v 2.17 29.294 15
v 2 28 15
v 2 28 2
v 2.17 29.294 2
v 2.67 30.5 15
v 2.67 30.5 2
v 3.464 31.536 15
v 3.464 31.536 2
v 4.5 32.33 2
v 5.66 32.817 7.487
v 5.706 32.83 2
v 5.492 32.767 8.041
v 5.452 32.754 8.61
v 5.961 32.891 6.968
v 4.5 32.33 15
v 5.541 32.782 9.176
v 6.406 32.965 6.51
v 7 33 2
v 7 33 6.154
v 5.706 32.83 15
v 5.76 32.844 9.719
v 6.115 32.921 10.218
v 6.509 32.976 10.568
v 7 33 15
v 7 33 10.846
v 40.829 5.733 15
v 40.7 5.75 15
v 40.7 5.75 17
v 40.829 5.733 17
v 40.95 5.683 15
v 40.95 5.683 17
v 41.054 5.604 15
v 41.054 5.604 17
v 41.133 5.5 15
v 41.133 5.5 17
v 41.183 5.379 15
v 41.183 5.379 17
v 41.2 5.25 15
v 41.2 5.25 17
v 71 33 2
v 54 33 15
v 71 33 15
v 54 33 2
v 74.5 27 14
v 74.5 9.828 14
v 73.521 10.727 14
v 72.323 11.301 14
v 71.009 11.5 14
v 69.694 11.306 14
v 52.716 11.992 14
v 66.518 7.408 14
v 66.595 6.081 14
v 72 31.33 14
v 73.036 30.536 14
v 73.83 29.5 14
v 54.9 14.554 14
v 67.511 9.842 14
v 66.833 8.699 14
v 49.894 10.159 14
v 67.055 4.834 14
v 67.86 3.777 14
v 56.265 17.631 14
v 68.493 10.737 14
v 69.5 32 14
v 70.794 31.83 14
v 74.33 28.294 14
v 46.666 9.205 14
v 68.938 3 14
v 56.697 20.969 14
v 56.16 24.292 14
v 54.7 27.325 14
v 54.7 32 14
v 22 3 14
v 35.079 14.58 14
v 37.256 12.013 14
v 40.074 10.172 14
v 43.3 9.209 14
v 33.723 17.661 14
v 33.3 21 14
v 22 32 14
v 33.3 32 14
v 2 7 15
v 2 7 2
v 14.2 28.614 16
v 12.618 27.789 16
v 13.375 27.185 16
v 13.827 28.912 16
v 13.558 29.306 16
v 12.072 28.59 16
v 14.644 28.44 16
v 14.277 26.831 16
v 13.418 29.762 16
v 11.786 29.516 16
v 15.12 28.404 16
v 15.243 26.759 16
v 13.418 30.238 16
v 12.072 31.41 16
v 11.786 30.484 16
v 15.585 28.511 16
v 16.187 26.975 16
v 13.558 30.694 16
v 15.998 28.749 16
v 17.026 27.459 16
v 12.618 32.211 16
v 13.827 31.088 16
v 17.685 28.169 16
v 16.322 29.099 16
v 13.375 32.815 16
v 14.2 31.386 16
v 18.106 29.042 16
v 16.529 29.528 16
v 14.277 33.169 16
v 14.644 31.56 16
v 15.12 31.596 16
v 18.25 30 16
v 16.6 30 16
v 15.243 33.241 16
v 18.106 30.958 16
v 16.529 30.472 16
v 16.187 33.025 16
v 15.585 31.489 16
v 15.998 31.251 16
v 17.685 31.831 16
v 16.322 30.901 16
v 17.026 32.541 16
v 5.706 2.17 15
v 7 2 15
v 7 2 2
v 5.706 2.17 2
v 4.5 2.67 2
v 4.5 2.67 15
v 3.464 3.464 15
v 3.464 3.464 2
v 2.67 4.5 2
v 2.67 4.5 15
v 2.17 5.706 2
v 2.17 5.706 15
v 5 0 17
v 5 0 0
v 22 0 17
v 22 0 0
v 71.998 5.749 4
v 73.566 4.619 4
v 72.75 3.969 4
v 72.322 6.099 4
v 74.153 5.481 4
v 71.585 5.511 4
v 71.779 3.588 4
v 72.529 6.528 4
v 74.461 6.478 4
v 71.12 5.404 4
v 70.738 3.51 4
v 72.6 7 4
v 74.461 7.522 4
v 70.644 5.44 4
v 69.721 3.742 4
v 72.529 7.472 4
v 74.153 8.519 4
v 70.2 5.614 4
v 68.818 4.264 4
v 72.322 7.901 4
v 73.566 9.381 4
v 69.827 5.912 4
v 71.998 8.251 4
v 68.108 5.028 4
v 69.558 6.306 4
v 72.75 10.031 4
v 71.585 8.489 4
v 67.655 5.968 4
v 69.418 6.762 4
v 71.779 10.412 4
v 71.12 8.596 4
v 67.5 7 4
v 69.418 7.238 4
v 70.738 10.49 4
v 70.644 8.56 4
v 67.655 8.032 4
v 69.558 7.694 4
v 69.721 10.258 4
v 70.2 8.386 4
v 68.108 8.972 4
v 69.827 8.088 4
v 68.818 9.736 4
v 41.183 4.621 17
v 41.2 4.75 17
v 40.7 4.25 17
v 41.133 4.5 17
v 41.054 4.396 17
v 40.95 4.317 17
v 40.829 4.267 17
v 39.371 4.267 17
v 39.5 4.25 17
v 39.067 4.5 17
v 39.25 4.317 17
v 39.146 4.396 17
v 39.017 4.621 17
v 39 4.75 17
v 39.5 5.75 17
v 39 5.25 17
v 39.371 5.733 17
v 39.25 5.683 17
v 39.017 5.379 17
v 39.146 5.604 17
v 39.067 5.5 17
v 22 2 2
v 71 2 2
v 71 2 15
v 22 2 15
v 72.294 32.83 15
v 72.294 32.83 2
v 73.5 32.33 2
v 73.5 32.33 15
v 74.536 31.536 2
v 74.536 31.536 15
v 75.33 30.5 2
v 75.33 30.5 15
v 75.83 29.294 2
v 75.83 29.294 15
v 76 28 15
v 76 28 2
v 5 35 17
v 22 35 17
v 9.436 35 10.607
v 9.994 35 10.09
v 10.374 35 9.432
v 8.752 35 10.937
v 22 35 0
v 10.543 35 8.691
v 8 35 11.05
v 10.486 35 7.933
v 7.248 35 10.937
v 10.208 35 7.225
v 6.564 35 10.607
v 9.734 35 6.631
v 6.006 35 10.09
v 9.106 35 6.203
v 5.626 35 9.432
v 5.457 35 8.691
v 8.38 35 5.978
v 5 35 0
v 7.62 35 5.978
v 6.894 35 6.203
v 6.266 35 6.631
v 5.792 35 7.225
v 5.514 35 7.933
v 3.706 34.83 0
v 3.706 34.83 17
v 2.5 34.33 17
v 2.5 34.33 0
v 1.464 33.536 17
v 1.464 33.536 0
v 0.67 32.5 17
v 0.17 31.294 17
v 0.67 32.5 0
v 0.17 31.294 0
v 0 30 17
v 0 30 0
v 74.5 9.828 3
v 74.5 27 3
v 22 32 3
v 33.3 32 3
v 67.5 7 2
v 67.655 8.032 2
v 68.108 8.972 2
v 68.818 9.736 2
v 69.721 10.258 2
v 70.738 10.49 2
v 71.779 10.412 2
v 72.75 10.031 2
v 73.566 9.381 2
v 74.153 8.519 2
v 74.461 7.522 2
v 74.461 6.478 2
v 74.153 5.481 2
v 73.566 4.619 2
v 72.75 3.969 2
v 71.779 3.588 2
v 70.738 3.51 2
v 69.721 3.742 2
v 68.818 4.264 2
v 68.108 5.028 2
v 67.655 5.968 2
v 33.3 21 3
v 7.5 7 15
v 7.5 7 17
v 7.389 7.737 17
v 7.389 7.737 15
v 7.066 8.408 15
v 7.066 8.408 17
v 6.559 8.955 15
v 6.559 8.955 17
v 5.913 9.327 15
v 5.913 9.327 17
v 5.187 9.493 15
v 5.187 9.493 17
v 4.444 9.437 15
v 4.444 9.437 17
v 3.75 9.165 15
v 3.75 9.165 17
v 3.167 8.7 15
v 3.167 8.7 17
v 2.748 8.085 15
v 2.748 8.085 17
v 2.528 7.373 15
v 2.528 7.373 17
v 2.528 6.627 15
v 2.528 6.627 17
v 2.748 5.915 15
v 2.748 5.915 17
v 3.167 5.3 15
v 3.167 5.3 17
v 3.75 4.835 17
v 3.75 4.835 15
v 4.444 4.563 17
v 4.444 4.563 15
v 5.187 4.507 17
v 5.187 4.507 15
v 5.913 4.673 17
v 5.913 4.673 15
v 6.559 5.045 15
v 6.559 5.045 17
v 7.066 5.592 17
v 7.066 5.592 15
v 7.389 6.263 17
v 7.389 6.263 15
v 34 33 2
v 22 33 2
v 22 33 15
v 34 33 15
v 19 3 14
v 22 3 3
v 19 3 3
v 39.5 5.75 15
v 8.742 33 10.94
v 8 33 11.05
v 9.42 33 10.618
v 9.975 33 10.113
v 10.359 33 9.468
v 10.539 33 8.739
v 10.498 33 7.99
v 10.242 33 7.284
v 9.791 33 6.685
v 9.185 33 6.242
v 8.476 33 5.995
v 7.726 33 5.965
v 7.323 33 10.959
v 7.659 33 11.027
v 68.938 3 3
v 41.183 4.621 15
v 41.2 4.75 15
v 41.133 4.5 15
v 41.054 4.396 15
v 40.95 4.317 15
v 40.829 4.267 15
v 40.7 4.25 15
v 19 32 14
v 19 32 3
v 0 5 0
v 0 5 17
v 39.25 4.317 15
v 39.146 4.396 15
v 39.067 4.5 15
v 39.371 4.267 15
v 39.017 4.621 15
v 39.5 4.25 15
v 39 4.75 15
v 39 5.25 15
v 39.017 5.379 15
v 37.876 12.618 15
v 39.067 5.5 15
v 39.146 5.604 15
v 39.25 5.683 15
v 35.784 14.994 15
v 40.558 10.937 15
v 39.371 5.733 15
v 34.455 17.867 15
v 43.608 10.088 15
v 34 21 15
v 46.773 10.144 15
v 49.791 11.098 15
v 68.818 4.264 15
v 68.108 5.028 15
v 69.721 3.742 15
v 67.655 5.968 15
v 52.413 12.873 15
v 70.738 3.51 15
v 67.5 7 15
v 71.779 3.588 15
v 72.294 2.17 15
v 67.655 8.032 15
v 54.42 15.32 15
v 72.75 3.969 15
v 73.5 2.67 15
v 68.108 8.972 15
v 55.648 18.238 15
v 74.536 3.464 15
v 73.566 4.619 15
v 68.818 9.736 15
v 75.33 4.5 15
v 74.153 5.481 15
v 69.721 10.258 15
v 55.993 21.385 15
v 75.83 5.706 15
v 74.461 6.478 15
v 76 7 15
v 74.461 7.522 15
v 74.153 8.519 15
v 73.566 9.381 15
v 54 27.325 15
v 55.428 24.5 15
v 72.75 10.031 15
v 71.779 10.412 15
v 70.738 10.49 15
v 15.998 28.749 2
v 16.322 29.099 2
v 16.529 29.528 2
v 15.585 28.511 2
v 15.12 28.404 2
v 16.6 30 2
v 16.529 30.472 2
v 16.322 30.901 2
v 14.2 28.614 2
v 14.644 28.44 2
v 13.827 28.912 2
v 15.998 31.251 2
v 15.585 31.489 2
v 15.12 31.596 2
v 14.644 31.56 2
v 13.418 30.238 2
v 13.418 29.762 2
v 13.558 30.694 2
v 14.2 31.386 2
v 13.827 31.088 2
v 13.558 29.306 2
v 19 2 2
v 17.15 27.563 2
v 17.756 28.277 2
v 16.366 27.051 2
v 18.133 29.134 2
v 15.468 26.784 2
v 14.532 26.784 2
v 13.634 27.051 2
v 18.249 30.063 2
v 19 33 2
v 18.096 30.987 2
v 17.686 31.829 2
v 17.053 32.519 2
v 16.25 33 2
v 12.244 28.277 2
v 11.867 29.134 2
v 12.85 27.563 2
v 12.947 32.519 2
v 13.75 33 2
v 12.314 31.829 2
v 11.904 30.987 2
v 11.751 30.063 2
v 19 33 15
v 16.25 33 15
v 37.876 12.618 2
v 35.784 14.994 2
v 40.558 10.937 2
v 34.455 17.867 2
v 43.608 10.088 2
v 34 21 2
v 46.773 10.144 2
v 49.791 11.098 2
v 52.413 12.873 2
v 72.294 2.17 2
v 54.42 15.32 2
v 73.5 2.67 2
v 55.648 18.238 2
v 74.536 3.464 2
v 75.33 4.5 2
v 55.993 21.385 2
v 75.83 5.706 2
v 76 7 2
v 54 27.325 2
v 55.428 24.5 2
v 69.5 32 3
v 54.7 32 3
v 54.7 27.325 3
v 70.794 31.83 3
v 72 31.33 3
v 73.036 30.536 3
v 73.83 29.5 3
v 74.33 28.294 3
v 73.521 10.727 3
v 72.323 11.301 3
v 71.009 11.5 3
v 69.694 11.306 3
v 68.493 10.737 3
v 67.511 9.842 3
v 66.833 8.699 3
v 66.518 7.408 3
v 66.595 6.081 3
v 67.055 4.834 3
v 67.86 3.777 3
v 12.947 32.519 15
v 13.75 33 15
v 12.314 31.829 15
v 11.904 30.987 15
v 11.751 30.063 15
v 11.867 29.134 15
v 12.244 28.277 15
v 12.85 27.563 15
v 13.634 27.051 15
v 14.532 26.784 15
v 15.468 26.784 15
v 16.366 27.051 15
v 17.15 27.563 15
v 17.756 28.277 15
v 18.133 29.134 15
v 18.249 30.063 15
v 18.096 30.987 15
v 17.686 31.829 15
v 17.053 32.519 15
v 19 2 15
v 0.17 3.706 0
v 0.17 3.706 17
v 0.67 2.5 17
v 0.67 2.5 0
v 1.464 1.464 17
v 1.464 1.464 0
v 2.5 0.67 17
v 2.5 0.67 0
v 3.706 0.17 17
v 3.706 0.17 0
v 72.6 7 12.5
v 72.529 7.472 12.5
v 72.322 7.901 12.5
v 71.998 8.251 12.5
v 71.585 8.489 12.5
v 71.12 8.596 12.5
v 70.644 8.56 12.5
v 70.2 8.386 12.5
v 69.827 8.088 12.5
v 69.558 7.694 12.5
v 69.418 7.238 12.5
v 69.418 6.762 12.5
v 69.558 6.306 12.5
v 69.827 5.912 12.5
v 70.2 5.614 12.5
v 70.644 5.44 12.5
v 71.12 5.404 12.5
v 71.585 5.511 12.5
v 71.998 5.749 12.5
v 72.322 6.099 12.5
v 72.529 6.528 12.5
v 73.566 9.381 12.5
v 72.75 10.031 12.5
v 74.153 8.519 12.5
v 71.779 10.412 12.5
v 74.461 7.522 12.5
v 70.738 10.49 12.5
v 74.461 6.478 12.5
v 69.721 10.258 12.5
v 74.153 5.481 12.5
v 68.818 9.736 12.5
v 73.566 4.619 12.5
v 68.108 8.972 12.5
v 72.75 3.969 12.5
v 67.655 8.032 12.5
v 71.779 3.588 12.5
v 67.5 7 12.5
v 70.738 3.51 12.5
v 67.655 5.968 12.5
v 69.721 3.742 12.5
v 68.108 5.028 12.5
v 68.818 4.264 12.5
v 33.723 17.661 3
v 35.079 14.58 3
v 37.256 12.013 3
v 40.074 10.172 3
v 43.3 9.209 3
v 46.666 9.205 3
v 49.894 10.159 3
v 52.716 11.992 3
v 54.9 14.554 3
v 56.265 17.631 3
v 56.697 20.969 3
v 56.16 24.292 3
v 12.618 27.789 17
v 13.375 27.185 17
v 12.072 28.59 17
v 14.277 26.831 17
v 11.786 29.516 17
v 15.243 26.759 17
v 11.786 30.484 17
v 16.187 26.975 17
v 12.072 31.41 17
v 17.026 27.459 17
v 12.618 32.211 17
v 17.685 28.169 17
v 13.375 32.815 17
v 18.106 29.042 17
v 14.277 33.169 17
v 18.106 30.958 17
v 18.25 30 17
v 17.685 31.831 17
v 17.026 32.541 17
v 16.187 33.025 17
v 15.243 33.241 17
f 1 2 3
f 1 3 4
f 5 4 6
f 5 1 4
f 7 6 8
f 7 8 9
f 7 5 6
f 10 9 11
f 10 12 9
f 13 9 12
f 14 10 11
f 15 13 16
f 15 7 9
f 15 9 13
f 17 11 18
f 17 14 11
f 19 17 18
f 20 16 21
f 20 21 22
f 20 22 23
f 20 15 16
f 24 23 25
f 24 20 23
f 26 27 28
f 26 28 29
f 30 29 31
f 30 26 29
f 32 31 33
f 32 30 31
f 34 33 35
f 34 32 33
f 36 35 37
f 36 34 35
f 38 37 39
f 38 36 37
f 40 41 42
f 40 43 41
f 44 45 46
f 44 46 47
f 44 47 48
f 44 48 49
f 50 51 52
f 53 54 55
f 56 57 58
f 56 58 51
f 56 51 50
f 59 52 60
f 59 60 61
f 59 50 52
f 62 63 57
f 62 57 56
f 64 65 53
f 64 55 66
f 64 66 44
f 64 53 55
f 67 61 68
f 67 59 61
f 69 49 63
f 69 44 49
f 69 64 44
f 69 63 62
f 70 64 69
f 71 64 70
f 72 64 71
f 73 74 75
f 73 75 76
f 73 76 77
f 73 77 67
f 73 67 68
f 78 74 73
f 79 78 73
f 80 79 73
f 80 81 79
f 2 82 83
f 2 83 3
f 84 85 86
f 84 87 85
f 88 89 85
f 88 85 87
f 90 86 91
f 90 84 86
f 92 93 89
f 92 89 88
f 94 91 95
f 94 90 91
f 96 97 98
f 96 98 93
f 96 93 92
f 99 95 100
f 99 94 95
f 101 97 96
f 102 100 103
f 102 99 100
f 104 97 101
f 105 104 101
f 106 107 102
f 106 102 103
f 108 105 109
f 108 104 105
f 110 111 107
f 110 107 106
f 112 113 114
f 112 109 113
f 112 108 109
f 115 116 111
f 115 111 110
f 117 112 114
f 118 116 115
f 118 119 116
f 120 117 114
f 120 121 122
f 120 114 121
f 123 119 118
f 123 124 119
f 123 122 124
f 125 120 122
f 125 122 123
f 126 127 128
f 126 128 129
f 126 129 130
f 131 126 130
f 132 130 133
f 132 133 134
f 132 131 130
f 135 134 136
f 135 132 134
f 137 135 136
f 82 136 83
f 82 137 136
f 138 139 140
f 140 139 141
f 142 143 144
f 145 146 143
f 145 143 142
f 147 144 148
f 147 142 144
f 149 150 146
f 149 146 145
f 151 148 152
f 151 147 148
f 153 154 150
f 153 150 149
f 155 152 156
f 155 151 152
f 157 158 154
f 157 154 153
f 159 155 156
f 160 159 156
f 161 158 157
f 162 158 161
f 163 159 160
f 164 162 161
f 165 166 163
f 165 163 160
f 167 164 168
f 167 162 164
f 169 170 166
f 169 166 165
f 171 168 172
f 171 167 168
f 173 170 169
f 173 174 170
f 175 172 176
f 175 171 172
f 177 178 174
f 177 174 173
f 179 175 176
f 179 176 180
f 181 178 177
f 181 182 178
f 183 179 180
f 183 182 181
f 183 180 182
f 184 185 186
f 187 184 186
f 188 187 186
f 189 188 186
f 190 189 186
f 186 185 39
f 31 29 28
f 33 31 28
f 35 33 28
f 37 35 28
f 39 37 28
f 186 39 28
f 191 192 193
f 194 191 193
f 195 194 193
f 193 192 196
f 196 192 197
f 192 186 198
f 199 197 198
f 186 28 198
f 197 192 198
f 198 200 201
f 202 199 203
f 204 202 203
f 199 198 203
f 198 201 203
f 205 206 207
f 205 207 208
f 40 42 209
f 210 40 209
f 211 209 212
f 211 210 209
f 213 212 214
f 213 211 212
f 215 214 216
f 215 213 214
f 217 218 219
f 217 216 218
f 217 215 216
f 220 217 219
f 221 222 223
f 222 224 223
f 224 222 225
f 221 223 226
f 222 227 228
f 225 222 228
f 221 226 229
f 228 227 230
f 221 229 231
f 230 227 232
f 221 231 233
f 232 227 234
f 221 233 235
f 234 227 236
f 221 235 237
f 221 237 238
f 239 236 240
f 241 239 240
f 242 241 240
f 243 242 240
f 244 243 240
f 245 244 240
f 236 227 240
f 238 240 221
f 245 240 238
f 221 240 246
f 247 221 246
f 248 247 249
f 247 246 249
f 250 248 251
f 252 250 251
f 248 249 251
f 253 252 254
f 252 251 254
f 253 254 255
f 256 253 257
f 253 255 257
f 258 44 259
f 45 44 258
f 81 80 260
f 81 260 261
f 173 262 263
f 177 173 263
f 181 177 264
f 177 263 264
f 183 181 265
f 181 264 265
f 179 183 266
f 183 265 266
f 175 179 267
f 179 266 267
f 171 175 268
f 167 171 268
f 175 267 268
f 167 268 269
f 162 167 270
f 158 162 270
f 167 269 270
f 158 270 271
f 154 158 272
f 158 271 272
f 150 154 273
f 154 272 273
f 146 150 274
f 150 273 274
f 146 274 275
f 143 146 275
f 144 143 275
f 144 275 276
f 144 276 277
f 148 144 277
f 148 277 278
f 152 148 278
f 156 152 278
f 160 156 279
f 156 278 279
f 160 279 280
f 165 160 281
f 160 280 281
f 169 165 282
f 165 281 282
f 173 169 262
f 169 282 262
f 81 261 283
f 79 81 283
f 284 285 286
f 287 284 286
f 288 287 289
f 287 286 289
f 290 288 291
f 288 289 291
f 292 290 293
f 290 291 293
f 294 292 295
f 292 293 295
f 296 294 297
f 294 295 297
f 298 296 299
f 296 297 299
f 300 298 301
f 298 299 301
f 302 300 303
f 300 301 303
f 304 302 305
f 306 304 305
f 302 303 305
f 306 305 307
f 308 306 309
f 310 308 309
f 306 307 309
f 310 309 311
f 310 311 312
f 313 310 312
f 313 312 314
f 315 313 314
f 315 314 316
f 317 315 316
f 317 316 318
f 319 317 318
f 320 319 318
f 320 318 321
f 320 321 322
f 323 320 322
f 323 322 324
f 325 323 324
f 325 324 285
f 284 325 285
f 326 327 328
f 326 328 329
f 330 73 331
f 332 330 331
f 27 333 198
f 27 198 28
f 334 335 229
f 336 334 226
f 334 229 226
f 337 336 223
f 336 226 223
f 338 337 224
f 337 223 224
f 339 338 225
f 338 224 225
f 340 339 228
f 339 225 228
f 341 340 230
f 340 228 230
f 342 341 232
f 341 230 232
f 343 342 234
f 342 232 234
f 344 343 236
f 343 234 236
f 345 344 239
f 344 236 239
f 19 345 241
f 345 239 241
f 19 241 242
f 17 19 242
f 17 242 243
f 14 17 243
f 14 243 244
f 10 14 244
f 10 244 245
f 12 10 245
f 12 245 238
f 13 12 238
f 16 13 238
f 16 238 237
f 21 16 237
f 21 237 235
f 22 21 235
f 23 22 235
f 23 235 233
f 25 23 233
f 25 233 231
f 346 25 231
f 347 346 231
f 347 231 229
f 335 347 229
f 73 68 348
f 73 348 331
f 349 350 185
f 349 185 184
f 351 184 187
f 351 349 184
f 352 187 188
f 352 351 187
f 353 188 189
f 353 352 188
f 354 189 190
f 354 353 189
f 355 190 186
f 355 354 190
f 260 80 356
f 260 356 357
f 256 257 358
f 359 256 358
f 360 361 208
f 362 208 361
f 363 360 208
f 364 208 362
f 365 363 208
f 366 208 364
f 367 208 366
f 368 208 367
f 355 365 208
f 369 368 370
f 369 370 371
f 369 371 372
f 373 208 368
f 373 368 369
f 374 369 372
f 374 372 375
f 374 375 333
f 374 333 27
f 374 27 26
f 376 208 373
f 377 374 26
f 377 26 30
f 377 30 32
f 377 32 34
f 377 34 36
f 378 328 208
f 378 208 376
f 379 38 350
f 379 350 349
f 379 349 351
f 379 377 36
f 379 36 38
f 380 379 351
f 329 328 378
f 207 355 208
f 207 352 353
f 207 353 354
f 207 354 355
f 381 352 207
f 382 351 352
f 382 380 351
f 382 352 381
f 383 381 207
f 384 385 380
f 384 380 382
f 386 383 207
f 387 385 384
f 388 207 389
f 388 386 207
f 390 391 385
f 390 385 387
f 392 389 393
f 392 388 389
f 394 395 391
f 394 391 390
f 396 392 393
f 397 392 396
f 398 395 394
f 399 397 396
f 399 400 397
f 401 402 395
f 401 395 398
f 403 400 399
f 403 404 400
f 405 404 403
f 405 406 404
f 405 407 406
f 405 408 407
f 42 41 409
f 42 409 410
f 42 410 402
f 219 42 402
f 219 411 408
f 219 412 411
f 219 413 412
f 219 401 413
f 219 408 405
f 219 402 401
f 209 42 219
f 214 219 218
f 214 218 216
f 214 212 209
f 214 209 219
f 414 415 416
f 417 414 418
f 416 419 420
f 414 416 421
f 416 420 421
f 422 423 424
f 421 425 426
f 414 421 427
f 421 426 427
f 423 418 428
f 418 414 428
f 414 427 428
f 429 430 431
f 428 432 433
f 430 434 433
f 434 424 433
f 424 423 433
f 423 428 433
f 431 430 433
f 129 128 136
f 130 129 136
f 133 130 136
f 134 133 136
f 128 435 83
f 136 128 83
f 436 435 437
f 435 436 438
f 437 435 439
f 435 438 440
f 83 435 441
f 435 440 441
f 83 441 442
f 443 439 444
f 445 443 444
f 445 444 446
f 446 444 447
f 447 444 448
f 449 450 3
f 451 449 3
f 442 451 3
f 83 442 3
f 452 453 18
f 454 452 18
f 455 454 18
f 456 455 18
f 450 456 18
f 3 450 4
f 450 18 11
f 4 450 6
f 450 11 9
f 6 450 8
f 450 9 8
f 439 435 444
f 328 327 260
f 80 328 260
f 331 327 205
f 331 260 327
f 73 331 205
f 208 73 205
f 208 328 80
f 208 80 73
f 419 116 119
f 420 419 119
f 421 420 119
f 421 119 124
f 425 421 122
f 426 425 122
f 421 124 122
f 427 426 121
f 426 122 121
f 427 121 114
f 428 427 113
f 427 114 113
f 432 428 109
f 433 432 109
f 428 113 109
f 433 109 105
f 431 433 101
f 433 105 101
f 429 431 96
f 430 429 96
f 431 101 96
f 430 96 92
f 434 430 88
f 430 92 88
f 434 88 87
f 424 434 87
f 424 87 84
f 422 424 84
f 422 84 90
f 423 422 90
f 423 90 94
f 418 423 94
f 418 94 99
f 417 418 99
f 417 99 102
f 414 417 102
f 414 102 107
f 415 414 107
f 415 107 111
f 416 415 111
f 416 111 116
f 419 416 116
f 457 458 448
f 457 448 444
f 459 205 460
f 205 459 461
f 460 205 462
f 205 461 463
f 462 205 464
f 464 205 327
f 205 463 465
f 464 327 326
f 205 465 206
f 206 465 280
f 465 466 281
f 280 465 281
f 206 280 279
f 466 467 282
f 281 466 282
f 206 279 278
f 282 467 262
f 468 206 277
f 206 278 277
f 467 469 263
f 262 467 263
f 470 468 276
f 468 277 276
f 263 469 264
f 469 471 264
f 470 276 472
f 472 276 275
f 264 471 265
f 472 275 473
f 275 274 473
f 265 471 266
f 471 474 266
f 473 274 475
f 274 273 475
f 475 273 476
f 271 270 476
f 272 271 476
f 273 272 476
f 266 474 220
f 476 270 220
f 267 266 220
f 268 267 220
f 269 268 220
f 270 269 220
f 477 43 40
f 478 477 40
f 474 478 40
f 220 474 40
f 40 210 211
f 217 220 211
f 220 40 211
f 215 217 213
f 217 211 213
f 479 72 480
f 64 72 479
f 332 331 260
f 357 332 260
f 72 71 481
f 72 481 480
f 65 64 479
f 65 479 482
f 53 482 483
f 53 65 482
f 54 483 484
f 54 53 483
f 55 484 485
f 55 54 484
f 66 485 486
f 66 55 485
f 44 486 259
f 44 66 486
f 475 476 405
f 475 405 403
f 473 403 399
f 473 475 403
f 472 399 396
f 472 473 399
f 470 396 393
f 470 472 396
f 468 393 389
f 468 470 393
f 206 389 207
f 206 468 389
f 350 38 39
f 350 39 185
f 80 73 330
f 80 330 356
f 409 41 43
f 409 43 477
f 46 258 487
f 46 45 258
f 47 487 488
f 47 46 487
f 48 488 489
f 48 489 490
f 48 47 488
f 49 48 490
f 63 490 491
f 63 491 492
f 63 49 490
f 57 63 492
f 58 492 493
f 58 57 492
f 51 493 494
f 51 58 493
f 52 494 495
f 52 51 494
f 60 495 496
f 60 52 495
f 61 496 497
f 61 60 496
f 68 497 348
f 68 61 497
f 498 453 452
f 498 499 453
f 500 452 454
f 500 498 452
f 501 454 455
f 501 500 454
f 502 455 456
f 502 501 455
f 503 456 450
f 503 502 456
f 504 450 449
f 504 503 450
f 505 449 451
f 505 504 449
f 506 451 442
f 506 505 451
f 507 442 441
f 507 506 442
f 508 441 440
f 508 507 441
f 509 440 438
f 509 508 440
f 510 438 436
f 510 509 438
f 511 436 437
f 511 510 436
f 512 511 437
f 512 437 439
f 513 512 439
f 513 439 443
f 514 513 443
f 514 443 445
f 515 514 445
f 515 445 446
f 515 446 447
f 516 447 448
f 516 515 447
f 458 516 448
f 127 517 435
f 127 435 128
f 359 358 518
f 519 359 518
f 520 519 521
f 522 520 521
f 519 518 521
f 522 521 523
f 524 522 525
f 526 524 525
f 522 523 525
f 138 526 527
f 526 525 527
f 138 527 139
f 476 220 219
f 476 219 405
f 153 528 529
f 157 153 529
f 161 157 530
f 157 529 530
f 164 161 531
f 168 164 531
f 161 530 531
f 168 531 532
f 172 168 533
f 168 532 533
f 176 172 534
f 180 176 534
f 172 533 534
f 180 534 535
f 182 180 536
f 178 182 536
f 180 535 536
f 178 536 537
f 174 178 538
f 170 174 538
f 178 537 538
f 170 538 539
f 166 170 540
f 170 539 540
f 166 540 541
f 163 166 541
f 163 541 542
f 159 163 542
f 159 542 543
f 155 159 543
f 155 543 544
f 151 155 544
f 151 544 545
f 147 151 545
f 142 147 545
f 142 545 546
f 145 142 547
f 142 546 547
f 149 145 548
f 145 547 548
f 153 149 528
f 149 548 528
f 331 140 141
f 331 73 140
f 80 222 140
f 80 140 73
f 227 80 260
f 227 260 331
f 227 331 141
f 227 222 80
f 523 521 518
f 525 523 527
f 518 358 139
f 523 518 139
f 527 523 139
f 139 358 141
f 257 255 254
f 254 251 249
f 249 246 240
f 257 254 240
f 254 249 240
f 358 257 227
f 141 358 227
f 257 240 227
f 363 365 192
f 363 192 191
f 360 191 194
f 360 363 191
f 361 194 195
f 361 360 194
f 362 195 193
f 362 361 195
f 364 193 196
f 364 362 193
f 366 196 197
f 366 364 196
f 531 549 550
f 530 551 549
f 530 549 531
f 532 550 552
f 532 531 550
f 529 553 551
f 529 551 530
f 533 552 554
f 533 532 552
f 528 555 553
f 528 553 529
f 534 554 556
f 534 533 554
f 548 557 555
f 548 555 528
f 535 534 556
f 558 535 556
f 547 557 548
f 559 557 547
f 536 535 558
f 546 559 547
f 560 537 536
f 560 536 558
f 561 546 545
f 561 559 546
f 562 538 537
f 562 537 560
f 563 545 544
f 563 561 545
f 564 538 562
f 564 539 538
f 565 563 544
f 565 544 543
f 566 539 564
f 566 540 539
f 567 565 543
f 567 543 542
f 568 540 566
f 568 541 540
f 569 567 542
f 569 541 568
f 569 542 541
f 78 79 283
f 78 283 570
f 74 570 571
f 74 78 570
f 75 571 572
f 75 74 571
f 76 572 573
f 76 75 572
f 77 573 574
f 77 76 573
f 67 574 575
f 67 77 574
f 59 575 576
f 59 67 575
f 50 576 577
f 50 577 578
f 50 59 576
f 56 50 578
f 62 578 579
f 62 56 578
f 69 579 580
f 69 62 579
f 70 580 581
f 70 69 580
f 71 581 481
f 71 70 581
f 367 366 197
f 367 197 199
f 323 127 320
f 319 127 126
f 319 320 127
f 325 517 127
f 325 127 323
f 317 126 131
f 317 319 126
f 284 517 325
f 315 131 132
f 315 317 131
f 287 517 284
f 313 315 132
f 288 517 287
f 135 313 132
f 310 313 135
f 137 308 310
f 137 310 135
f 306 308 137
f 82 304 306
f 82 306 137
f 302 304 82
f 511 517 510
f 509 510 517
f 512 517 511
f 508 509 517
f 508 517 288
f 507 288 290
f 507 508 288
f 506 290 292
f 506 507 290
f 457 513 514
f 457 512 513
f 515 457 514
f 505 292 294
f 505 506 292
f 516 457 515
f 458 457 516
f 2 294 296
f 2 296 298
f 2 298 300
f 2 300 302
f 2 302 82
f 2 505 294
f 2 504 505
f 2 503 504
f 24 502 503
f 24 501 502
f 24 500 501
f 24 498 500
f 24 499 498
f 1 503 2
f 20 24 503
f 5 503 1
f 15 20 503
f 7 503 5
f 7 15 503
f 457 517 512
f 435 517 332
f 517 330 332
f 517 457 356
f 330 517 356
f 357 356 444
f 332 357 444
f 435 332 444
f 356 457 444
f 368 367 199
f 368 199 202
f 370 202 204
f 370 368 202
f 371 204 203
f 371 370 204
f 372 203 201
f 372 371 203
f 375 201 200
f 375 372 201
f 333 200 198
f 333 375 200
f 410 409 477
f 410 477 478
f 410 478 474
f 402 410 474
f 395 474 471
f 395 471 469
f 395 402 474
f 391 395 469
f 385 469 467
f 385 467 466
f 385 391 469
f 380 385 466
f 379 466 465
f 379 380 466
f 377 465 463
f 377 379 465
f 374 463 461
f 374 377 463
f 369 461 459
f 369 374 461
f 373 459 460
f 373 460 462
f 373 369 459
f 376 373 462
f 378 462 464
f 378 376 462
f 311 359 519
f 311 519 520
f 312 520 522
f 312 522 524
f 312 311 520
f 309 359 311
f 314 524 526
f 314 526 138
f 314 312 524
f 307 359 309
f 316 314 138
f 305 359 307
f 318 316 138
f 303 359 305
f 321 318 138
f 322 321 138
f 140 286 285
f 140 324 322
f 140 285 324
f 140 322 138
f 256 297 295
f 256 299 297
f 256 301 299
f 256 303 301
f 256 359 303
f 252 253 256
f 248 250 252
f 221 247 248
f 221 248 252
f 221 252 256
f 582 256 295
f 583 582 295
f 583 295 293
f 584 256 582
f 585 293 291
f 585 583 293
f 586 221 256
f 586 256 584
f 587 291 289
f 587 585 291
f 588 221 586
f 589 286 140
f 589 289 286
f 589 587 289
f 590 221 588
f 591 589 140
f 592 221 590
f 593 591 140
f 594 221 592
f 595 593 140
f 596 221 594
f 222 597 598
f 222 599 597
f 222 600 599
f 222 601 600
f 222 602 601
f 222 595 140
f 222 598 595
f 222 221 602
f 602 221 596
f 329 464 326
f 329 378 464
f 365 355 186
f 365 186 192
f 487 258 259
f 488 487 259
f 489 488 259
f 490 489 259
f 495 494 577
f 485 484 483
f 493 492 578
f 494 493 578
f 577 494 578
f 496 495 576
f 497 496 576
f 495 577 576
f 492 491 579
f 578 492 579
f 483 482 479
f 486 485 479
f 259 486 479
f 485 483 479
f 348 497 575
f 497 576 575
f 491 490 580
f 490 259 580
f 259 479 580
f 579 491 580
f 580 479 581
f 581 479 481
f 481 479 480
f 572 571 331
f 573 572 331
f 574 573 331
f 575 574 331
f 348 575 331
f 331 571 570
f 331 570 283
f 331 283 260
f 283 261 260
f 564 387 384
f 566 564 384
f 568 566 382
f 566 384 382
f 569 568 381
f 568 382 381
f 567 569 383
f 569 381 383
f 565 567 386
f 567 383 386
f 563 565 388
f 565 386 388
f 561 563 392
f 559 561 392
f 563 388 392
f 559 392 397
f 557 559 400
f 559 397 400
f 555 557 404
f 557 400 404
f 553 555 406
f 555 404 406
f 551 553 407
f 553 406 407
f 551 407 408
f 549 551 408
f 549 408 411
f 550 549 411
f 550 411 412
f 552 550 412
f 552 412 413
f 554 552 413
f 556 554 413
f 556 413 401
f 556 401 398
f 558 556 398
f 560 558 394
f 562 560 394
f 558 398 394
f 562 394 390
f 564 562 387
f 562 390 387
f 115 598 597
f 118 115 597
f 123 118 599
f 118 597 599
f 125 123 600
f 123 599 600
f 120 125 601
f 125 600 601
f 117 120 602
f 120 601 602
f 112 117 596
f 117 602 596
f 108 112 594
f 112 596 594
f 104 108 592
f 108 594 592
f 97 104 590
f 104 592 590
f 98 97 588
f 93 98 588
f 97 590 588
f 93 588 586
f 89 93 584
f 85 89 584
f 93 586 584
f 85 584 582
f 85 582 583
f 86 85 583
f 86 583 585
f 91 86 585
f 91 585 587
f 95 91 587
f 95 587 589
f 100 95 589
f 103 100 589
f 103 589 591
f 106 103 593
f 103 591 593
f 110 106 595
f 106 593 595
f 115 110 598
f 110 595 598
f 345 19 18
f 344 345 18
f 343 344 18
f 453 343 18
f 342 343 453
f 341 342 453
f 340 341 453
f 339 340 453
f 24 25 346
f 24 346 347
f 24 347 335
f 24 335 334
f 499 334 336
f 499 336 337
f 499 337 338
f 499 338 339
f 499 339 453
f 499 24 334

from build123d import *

# Parameters (mm, degrees)
BOSS_EXTRUDE1_DEPTH  = 17
CUT_EXTRUDE1_START   = -17
SKETCH3_W            = 12
SKETCH3_H            = 2
CUT_EXTRUDE1_DEPTH   = 17
CUT_EXTRUDE2_START   = -2
CUT_EXTRUDE2_DEPTH   = 2
SKETCH5_W            = 60
SKETCH5_H            = 35
CUT_EXTRUDE3_DEPTH   = 2
CUT_EXTRUDE4_DEPTH   = 11
CUT_EXTRUDE11_DEPTH  = 13
BOSS_EXTRUDE2_DEPTH  = 2
SKETCH13_R           = 2.5
CUT_EXTRUDE12_DEPTH  = 5
SKETCH14_R           = 2.55
CUT_EXTRUDE14_DEPTH  = 15
BOSS_EXTRUDE5_REACH  = 87.381
SKETCH15_R           = 3.25
SKETCH15_R_2         = 1.6
SKETCH15_4_R         = 3.25
SKETCH15_4_R_2       = 1.6
CUT_EXTRUDE16_DEPTH  = 1
SKETCH18_R           = 1.6
CUT_EXTRUDE17_DEPTH  = 15
SKETCH20_R           = 4.5
SKETCH20_R_2         = 1.6
BOSS_EXTRUDE6_DEPTH  = 13
SKETCH20_3_R         = 1.6
CUT_EXTRUDE20_DEPTH  = 86.005882191
SKETCH22_W           = 13
SKETCH22_H           = 31
SKETCH22_W_2         = 11
SKETCH22_H_2         = 29
BOSS_EXTRUDE7_DEPTH  = 3
SKETCH21_R           = 3.5
CUT_EXTRUDE21_DEPTH  = 2
SKETCH29_R           = 3.5
CUT_EXTRUDE22_DEPTH  = 2.5
BOSS_EXTRUDE10_DEPTH = 13


with BuildPart() as part:
    # Sketch1 → Boss-Extrude1 (new body)
    with BuildSketch(Plane.XY):
        with BuildLine():
            ThreePointArc((0, 5), (1.464466094, 1.464466094), (5, 0))
            Line((5, 0), (73, 0))
            ThreePointArc((73, 0), (76.535533906, 1.464466094), (78, 5))
            Line((78, 5), (78, 30))
            ThreePointArc((78, 30), (76.535533906, 33.535533906), (73, 35))
            Line((73, 35), (54, 35))
            Line((54, 35), (54, 27.32455532))
            ThreePointArc((54, 27.32455532), (48.31662479, 10.511911518), (34, 21))
            Line((34, 21), (34, 35))
            Line((34, 35), (5, 35))
            ThreePointArc((5, 35), (1.464466094, 33.535533906), (0, 30))
            Line((0, 30), (0, 5))
        make_face()
    extrude(amount=BOSS_EXTRUDE1_DEPTH)

    # Sketch3 → Cut-Extrude1 (cut)
    with BuildSketch(Plane.XY.offset(17).offset(CUT_EXTRUDE1_START)):
        with Locations((28, 34)):
            Rectangle(SKETCH3_W, SKETCH3_H)
        with BuildLine():
            Line((54, 33), (71, 33))
            ThreePointArc((71, 33), (74.535533906, 31.535533906), (76, 28))
            Line((76, 28), (76, 7))
            ThreePointArc((76, 7), (74.535533906, 3.464466094), (71, 2))
            Line((71, 2), (22, 2))
            Line((22, 2), (22, 0))
            Line((22, 0), (73, 0))
            ThreePointArc((73, 0), (76.535533906, 1.464466094), (78, 5))
            Line((78, 5), (78, 30))
            ThreePointArc((78, 30), (76.535533906, 33.535533906), (73, 35))
            Line((73, 35), (54, 35))
            Line((54, 35), (54, 33))
        make_face()
    extrude(amount=CUT_EXTRUDE1_DEPTH, mode=Mode.SUBTRACT)

    # Sketch3<3> → Cut-Extrude2 (cut)
    with BuildSketch(Plane.XY.offset(17).offset(CUT_EXTRUDE2_START)):
        with BuildLine():
            ThreePointArc((76, 28), (74.535533906, 31.535533906), (71, 33))
            Line((71, 33), (54, 33))
            Line((54, 33), (54, 27.32455532))
            ThreePointArc((54, 27.32455532), (48.31662479, 10.511911518), (34, 21))
            Line((34, 21), (34, 33))
            Line((34, 33), (22, 33))
            Line((22, 33), (22, 2))
            Line((22, 2), (71, 2))
            ThreePointArc((71, 2), (74.535533906, 3.464466094), (76, 7))
            Line((76, 7), (76, 28))
        make_face()
    extrude(amount=CUT_EXTRUDE2_DEPTH, mode=Mode.SUBTRACT)

    # Sketch5 → Cut-Extrude3 (cut)
    with BuildSketch(Plane(origin=(0, 0, 0), x_dir=(-1, 0, 0), z_dir=(0, 0, -1))):
        with Locations((-52, 15.5)):
            Rectangle(SKETCH5_W, SKETCH5_H)
    extrude(amount=-CUT_EXTRUDE3_DEPTH, mode=Mode.SUBTRACT)

    # Sketch6 → Cut-Extrude4 (cut)
    with BuildSketch(Plane.XY.offset(14)):
        with BuildLine():
            Line((22, 32), (69.5, 32))
            ThreePointArc((69.5, 32), (73.035533906, 30.535533906), (74.5, 27))
            Line((74.5, 27), (74.5, 8))
            ThreePointArc((74.5, 8), (73.035533906, 4.464466094), (69.5, 3))
            Line((69.5, 3), (22, 3))
            Line((22, 3), (22, 32))
        make_face()
    extrude(amount=-CUT_EXTRUDE4_DEPTH, mode=Mode.SUBTRACT)

    # Sketch11 → Cut-Extrude11 (cut)
    with BuildSketch(Plane.XY.offset(15)):
        with BuildLine():
            Line((22, 2), (7, 2))
            ThreePointArc((7, 2), (3.464466094, 3.464466094), (2, 7))
            Line((2, 7), (2, 28))
            ThreePointArc((2, 28), (3.464466094, 31.535533906), (7, 33))
            Line((7, 33), (22, 33))
            Line((22, 33), (22, 2))
        make_face()
    extrude(amount=-CUT_EXTRUDE11_DEPTH, mode=Mode.SUBTRACT)


with BuildPart() as cut_extrude11_piece_1:
    # of the separate pieces the step leaves, piece 1, a body of its own (cut_extrude11_pieces)
    add(part.part.solids().sort_by_distance((0, 30, 0))[0])

    # Sketch13 → Cut-Extrude12 (cut)
    with BuildSketch(Plane.XY.offset(17)):
        with Locations((5, 7)):
            Circle(SKETCH13_R)
    extrude(amount=-CUT_EXTRUDE12_DEPTH, mode=Mode.SUBTRACT)

    # Sketch14 → Cut-Extrude14 (cut)
    with BuildSketch(Plane(origin=(0, 35, 0), x_dir=(1, 0, 0), z_dir=(0, 1, 0))):
        with Locations(Location((8, -8.5, 0), (0, 0, 270))):
            Circle(SKETCH14_R)
    extrude(amount=-CUT_EXTRUDE14_DEPTH, mode=Mode.SUBTRACT)

    # Sketch15 → Boss-Extrude5 (add, up to next)
    with BuildSketch(Plane.XY.offset(17), mode=Mode.PRIVATE) as boss_extrude5_sk1:
        with Locations((15, 30)):
            Circle(SKETCH15_R)
        with Locations((15, 30)):
            Circle(SKETCH15_R_2, mode=Mode.SUBTRACT)
    boss_extrude5_tool1 = extrude(boss_extrude5_sk1.sketch, amount=-BOSS_EXTRUDE5_REACH, mode=Mode.PRIVATE) - cut_extrude11_piece_1.part
    add(boss_extrude5_tool1.solids().sort_by_distance((11.841924, 30, 17))[0])

    # Sketch15<4> → Cut-Extrude16 (cut)
    with BuildSketch(Plane.XY.offset(17)):
        with Locations((15, 30)):
            Circle(SKETCH15_4_R)
        with Locations((15, 30)):
            Circle(SKETCH15_4_R_2, mode=Mode.SUBTRACT)
    extrude(amount=-CUT_EXTRUDE16_DEPTH, mode=Mode.SUBTRACT)

    # Sketch18 → Cut-Extrude17 (cut)
    with BuildSketch(Plane.XY.offset(17)):
        with Locations((15, 30)):
            Circle(SKETCH18_R)
    extrude(amount=-CUT_EXTRUDE17_DEPTH, mode=Mode.SUBTRACT)

    # Sketch22 → Boss-Extrude7 (add)
    with BuildSketch(Plane(origin=(22, 0, 0), x_dir=(0, 0, -1), z_dir=(1, 0, 0))):
        with Locations((-8.5, 17.5)):
            Rectangle(SKETCH22_W, SKETCH22_H)
        with Locations((-8.5, 17.5)):
            Rectangle(SKETCH22_W_2, SKETCH22_H_2, mode=Mode.SUBTRACT)
    extrude(amount=-BOSS_EXTRUDE7_DEPTH)


with BuildPart() as cut_extrude11_piece_2:
    # of the separate pieces the step leaves, piece 2, a body of its own (cut_extrude11_pieces)
    add(part.part.solids().sort_by_distance((34, 33, 2))[0])

    # Sketch12 → Boss-Extrude2 (add)
    with BuildSketch(Plane.XY.offset(15)):
        with BuildLine():
            Line((39.5, 5.75), (40.7, 5.75))
            ThreePointArc((40.7, 5.75), (41.053553391, 5.603553391), (41.2, 5.25))
            Line((41.2, 5.25), (41.2, 4.75))
            ThreePointArc((41.2, 4.75), (41.053553391, 4.396446609), (40.7, 4.25))
            Line((40.7, 4.25), (39.5, 4.25))
            ThreePointArc((39.5, 4.25), (39.146446609, 4.396446609), (39, 4.75))
            Line((39, 4.75), (39, 5.25))
            ThreePointArc((39, 5.25), (39.146446609, 5.603553391), (39.5, 5.75))
        make_face()
    extrude(amount=BOSS_EXTRUDE2_DEPTH)

    # Sketch20 → Boss-Extrude6 (add)
    with BuildSketch(Plane.XY.offset(15)):
        with Locations((71, 7)):
            Circle(SKETCH20_R)
        with Locations((71, 7)):
            Circle(SKETCH20_R_2, mode=Mode.SUBTRACT)
    extrude(amount=-BOSS_EXTRUDE6_DEPTH)

    # Sketch20<3> → Cut-Extrude20 (cut, through all)
    with BuildSketch(Plane.XY.offset(15)):
        with Locations((71, 7)):
            Circle(SKETCH20_3_R)
    extrude(amount=-CUT_EXTRUDE20_DEPTH, mode=Mode.SUBTRACT)

    # Sketch21 → Cut-Extrude21 (cut)
    with BuildSketch(Plane(origin=(0, 0, 2), x_dir=(-1, 0, 0), z_dir=(0, 0, -1))):
        with Locations((-71, 7)):
            Circle(SKETCH21_R)
    extrude(amount=-CUT_EXTRUDE21_DEPTH, mode=Mode.SUBTRACT)

    # Sketch29 → Cut-Extrude22 (cut)
    with BuildSketch(Plane.XY.offset(15)):
        with Locations(Location((71, 7, 0), (0, 0, 180))):
            Circle(SKETCH29_R)
    extrude(amount=-CUT_EXTRUDE22_DEPTH, mode=Mode.SUBTRACT)

    # Sketch36 → Boss-Extrude10 (add)
    with BuildSketch(Plane.XY.offset(15)):
        with BuildLine():
            Line((34, 21), (34, 33))
            Line((34, 33), (33.3, 33))
            Line((33.3, 33), (33.3, 21))
            ThreePointArc((33.3, 21), (48.314061384, 9.565059525), (54.7, 27.32455532))
            Line((54.7, 27.32455532), (54.7, 33))
            Line((54.7, 33), (54, 33))
            Line((54, 33), (54, 27.32455532))
            ThreePointArc((54, 27.32455532), (48.31662479, 10.511911518), (34, 21))
        make_face()
    extrude(amount=-BOSS_EXTRUDE10_DEPTH)


solid = Compound([cut_extrude11_piece_1.part, cut_extrude11_piece_2.part])
